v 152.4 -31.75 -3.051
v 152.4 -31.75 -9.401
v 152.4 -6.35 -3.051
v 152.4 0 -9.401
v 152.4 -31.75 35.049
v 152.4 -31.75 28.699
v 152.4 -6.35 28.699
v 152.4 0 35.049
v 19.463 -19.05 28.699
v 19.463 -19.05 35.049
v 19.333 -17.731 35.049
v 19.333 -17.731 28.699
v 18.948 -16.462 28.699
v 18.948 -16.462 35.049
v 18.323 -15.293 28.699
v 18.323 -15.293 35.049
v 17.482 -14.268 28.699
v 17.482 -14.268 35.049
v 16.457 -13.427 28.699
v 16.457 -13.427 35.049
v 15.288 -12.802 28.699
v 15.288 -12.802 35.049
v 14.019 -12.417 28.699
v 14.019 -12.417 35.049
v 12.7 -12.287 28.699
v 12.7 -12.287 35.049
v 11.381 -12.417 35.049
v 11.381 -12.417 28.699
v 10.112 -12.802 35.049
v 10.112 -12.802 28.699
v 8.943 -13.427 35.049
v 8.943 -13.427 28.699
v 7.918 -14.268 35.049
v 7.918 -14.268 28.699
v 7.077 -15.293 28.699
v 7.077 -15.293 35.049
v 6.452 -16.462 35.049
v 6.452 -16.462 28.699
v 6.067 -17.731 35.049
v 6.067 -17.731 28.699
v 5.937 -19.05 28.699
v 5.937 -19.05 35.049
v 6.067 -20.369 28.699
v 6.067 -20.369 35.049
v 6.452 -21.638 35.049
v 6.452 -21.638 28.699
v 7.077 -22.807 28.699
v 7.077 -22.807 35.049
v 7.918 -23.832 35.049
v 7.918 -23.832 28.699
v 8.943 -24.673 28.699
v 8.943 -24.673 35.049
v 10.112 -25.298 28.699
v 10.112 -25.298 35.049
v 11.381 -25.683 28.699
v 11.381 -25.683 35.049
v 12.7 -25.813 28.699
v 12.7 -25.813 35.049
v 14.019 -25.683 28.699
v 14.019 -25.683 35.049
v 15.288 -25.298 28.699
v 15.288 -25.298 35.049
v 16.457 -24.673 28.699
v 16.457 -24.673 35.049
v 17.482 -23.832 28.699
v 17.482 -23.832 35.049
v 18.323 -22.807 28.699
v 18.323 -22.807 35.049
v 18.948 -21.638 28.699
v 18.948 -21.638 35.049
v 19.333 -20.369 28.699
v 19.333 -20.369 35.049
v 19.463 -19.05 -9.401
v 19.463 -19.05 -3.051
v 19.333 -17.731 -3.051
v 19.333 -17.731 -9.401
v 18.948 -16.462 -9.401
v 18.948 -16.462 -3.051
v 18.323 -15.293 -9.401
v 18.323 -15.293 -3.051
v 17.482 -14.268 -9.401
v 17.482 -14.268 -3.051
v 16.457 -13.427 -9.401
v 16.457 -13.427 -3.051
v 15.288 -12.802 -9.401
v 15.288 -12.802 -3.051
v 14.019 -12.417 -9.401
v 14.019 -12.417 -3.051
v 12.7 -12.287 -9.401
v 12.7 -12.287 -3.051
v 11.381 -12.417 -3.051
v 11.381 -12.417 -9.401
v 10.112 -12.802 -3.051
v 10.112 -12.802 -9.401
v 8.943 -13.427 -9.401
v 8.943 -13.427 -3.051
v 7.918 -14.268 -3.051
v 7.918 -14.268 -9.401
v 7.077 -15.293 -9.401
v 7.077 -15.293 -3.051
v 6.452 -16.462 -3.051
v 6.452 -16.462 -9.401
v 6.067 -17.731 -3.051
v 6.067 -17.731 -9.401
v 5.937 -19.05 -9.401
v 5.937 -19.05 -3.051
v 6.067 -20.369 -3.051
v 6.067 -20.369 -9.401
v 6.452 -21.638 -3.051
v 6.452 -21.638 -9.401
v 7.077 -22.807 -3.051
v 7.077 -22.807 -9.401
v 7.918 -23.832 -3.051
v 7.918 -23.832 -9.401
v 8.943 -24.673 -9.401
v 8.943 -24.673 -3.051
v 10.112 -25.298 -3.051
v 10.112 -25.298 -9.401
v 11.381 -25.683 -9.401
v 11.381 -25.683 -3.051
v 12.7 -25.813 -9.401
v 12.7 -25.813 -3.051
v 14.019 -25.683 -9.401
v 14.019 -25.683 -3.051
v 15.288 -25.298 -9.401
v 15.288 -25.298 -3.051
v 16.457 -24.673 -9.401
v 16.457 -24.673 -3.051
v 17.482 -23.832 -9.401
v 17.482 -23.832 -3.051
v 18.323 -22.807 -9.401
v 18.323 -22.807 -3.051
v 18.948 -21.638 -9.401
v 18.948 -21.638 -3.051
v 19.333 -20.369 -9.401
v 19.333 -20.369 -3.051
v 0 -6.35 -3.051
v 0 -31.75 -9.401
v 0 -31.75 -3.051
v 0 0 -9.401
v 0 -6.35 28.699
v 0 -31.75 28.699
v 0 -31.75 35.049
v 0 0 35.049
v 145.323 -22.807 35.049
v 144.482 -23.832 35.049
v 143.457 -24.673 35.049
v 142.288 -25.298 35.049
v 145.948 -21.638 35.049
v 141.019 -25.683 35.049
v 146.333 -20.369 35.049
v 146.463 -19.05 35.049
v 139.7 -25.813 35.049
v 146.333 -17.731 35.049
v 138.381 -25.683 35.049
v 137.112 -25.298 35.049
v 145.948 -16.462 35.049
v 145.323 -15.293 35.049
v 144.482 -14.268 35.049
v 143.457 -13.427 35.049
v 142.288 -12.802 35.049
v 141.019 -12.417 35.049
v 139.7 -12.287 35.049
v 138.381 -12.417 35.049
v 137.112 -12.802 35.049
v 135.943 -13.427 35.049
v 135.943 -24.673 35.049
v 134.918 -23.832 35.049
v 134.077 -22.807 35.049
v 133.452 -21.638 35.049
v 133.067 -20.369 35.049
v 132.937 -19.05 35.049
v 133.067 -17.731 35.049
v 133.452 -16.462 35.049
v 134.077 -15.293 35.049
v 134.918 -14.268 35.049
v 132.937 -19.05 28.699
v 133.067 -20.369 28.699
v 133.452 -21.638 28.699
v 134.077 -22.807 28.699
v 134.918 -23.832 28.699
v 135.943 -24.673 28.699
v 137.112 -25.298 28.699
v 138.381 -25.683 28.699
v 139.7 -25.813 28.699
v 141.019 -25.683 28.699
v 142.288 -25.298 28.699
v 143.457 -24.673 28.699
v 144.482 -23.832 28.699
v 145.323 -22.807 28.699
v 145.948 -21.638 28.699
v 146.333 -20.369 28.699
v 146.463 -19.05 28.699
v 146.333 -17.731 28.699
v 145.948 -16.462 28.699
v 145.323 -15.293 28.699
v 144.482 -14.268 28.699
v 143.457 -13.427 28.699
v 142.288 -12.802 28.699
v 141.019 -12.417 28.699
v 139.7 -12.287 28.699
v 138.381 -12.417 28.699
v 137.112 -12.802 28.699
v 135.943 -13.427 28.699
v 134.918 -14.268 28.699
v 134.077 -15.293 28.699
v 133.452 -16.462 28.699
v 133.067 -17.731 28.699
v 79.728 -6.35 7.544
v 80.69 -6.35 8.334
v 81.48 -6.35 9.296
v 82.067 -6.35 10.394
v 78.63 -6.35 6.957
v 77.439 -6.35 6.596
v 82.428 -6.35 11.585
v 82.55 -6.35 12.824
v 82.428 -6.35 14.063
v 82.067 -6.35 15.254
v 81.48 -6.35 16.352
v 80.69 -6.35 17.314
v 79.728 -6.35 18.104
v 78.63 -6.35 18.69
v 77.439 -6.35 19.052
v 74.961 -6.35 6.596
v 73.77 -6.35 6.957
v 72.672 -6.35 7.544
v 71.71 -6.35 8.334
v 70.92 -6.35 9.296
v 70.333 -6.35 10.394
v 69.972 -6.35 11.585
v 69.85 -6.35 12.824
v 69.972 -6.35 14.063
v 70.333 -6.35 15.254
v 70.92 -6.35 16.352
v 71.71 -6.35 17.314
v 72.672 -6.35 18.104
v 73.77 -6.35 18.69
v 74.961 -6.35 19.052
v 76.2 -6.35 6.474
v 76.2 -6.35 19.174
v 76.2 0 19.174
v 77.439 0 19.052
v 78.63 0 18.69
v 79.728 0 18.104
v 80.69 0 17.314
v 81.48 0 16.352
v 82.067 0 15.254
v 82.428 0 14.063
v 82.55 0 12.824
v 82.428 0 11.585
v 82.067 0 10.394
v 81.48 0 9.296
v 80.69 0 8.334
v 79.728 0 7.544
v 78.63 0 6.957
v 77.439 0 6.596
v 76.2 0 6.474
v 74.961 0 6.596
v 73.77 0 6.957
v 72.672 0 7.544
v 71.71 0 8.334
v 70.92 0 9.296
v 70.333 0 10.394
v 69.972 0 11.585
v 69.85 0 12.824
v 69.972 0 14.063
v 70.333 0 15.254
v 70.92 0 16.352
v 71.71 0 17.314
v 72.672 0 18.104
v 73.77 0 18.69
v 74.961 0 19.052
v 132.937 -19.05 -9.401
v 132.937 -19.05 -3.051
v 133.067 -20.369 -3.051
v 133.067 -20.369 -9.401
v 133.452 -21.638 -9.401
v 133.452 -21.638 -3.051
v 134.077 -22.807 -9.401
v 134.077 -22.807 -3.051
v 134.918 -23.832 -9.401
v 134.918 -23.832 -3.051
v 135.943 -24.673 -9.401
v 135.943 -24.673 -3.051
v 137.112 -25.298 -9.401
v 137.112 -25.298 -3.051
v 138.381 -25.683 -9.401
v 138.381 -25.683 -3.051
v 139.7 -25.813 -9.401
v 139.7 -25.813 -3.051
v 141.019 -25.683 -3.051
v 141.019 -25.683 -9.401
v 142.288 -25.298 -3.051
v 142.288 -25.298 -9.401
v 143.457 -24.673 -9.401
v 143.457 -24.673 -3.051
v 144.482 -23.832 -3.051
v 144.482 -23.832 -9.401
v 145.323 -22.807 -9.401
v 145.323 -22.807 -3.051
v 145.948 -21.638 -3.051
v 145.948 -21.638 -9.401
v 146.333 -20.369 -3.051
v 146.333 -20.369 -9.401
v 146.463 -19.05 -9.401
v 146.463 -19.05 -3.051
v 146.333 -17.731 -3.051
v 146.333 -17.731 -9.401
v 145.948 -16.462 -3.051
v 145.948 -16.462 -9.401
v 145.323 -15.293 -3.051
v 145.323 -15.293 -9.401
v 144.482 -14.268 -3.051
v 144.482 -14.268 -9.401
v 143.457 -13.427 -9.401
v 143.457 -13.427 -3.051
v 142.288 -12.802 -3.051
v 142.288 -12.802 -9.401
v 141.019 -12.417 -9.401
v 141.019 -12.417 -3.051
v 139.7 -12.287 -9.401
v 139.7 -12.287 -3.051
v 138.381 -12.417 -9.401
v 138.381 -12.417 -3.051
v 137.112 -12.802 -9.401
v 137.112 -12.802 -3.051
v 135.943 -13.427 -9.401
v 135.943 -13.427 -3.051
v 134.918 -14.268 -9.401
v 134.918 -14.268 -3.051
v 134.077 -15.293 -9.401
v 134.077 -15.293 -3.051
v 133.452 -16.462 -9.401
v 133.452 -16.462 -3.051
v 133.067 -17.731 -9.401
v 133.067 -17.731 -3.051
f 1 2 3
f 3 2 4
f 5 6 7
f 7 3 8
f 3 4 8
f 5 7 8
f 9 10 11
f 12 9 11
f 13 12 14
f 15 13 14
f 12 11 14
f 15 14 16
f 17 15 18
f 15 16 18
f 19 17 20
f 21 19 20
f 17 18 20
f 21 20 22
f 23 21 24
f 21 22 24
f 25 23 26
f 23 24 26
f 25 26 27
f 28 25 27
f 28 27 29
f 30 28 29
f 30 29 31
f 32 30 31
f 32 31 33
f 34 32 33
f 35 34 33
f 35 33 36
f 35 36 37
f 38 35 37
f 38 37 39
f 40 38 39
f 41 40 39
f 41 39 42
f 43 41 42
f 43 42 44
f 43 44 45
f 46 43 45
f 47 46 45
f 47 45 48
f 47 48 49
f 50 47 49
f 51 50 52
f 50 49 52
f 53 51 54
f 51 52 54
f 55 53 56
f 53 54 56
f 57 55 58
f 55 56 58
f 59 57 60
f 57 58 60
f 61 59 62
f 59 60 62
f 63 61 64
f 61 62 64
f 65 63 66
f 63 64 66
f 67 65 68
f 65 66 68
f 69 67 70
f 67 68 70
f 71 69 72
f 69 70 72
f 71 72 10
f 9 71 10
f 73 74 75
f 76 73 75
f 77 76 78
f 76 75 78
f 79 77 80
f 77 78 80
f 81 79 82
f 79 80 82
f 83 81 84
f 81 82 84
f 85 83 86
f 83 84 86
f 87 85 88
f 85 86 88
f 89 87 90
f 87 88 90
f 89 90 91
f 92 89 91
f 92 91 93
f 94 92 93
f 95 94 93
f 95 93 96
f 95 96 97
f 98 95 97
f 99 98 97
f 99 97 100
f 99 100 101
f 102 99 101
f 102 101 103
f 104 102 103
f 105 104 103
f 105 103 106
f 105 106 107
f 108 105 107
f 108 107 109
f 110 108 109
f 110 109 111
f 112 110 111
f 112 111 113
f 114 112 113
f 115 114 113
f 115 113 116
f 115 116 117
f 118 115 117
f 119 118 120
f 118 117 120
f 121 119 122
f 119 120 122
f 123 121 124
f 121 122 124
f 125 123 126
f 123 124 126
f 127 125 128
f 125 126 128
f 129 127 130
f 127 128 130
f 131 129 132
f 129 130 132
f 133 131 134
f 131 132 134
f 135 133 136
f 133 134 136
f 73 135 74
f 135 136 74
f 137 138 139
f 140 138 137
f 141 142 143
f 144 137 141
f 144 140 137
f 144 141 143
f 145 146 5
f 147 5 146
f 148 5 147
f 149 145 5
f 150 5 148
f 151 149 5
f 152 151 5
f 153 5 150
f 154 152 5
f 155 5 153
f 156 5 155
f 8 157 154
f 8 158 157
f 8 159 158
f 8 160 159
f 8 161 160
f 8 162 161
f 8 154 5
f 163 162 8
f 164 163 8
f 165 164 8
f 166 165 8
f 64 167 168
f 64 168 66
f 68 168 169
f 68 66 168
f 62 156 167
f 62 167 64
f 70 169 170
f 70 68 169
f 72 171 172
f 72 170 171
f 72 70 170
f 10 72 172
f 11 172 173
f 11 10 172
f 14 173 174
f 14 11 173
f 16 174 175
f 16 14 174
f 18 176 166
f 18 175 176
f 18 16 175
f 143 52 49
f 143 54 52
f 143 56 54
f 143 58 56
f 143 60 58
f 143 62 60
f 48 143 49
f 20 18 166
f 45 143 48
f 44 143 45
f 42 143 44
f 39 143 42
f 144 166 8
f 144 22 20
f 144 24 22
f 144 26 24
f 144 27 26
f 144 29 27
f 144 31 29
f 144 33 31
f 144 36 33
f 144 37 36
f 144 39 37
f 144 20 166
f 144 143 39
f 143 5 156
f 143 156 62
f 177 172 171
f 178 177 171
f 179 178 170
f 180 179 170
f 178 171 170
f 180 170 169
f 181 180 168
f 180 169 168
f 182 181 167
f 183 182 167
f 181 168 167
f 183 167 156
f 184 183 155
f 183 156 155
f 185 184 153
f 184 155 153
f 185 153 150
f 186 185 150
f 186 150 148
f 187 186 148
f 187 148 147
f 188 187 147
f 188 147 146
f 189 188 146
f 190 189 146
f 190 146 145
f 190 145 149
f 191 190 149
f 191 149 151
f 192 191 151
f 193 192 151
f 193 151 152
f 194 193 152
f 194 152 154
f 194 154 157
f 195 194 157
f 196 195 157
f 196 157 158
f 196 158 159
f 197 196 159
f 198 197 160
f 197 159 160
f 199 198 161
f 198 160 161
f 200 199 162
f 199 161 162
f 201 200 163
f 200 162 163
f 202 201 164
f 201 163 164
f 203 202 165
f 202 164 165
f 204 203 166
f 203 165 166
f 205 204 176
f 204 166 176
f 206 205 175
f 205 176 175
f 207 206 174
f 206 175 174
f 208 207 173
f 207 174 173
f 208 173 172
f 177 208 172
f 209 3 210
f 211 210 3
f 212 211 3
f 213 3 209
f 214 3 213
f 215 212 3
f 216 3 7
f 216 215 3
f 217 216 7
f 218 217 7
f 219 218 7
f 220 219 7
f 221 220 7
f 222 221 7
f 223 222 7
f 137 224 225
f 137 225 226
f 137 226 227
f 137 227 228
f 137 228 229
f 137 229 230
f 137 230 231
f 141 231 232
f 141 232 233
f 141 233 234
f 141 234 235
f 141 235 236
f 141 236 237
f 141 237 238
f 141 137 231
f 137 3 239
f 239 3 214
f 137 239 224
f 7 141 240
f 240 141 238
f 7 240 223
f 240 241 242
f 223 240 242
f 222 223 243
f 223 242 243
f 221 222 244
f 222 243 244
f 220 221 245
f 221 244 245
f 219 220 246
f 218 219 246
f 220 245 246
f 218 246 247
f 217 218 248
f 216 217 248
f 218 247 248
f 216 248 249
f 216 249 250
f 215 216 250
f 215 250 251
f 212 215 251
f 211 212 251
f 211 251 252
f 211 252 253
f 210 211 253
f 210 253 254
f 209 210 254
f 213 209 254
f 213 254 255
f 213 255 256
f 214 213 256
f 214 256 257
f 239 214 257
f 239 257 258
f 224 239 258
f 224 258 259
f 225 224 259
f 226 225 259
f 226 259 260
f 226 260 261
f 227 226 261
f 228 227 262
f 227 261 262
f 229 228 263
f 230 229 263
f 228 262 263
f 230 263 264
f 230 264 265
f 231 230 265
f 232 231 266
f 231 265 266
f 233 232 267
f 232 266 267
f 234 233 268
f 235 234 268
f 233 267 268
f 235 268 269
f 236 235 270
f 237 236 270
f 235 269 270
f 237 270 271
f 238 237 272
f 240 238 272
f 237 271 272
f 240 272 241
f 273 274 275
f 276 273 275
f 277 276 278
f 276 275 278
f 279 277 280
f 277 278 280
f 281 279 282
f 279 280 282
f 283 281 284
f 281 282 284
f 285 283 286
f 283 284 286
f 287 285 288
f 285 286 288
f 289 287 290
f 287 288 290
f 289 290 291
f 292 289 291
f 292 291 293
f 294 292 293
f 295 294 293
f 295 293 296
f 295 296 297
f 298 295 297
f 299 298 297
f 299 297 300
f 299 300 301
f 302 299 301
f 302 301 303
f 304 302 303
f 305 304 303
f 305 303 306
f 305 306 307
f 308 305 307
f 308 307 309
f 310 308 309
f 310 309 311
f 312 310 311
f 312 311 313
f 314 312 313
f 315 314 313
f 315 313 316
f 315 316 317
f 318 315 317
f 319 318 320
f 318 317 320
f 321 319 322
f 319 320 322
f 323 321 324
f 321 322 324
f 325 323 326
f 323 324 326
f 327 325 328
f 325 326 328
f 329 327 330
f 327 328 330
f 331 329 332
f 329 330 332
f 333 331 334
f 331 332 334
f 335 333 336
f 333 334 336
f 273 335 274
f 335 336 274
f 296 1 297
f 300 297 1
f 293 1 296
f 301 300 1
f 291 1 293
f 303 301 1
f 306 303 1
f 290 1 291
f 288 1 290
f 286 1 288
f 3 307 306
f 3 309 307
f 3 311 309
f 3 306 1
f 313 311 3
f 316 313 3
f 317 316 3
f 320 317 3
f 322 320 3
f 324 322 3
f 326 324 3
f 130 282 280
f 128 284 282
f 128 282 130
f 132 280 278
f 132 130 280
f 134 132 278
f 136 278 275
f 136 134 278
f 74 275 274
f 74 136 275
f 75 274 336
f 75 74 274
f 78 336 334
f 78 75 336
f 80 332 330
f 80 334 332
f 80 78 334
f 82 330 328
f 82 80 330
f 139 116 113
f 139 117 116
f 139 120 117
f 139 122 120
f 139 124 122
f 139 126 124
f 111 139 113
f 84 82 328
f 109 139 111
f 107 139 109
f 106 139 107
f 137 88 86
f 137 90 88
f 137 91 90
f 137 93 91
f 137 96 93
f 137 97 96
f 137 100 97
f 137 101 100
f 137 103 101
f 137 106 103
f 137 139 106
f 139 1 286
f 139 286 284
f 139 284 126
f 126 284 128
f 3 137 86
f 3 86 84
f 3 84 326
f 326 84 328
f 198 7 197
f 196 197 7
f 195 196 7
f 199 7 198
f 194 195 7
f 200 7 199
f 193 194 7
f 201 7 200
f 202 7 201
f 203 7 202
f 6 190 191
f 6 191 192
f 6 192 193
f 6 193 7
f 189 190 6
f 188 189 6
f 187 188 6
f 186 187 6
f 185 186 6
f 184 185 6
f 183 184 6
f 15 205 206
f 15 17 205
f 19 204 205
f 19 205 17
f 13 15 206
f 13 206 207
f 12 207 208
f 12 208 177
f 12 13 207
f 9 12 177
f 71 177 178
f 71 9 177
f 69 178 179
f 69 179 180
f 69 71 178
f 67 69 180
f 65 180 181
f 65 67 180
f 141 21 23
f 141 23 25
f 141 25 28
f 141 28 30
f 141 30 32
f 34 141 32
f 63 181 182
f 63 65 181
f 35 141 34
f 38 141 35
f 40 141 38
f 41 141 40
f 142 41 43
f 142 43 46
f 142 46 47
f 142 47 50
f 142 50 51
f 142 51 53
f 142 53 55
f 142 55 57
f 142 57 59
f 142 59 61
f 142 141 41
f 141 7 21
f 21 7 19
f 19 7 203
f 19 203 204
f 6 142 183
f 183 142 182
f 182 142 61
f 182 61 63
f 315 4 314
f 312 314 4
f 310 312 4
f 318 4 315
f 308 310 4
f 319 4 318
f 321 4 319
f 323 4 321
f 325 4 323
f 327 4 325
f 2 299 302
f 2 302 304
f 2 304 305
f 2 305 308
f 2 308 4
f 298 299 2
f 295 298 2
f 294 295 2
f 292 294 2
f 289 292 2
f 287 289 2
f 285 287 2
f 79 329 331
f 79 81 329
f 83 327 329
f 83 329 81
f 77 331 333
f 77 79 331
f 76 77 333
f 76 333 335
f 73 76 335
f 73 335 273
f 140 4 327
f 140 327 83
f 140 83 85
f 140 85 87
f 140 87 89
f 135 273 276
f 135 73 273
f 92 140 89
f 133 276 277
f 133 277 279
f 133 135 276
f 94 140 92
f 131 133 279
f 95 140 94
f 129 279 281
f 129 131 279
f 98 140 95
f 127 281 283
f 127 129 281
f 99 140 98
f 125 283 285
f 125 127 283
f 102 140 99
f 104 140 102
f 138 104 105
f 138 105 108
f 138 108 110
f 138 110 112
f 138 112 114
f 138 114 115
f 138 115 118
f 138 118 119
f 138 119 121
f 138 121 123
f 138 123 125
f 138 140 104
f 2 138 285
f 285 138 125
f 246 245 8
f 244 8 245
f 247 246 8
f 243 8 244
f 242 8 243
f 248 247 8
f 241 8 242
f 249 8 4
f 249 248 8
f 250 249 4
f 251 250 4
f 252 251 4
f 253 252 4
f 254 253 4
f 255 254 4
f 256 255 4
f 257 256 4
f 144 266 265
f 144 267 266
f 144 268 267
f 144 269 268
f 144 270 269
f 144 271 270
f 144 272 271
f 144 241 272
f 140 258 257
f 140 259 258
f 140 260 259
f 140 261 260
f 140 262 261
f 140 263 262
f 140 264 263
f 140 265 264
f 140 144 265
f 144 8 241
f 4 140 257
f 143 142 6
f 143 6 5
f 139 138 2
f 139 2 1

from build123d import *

# Parameters (mm, degrees)
BOSS_EXTRUDE3_DEPTH = 152.4
CUT_EXTRUDE3_REACH  = 161.569
SKETCH7_R           = 6.35
SKETCH8_R           = 6.763254826
CUT_EXTRUDE4_DEPTH  = 162.893869557


with BuildPart() as part:
    # Sketch6 → Boss-Extrude3 (new body)
    with BuildSketch(Plane(origin=(0, 0, 0), x_dir=(0, 0, -1), z_dir=(1, 0, 0))):
        Polygon((-35.048704326, 0), (9.401295674, 0), (9.401295674, -31.75), (3.051295674, -31.75), (3.051295674, -6.35), (-28.698704326, -6.35), (-28.698704326, -31.75), (-35.048704326, -31.75), align=None)
    extrude(amount=BOSS_EXTRUDE3_DEPTH)

    # Sketch7 → Cut-Extrude3 (cut, up to next)
    with BuildSketch(Plane(origin=(0, 0, 0), x_dir=(1, 0, 0), z_dir=(0, 1, 0)), mode=Mode.PRIVATE) as cut_extrude3_sk1:
        with Locations(Location((76.2, -12.823704326, 0), (0, 0, 270))):
            Circle(SKETCH7_R)
    cut_extrude3_tool1 = extrude(cut_extrude3_sk1.sketch, amount=-CUT_EXTRUDE3_REACH, mode=Mode.PRIVATE) & part.part
    add(cut_extrude3_tool1.solids().sort_by_distance((76.2, 0, 12.823704))[0], mode=Mode.SUBTRACT)

    # Sketch8 → Cut-Extrude4 (cut, through all)
    with BuildSketch(Plane.XY.offset(35.048704326)):
        with Locations((12.7, -19.05)):
            Circle(SKETCH8_R)
        with Locations(Location((139.7, -19.05, 0), (0, 0, 180))):
            Circle(SKETCH8_R)
    extrude(amount=-CUT_EXTRUDE4_DEPTH, mode=Mode.SUBTRACT)


solid = part.part
